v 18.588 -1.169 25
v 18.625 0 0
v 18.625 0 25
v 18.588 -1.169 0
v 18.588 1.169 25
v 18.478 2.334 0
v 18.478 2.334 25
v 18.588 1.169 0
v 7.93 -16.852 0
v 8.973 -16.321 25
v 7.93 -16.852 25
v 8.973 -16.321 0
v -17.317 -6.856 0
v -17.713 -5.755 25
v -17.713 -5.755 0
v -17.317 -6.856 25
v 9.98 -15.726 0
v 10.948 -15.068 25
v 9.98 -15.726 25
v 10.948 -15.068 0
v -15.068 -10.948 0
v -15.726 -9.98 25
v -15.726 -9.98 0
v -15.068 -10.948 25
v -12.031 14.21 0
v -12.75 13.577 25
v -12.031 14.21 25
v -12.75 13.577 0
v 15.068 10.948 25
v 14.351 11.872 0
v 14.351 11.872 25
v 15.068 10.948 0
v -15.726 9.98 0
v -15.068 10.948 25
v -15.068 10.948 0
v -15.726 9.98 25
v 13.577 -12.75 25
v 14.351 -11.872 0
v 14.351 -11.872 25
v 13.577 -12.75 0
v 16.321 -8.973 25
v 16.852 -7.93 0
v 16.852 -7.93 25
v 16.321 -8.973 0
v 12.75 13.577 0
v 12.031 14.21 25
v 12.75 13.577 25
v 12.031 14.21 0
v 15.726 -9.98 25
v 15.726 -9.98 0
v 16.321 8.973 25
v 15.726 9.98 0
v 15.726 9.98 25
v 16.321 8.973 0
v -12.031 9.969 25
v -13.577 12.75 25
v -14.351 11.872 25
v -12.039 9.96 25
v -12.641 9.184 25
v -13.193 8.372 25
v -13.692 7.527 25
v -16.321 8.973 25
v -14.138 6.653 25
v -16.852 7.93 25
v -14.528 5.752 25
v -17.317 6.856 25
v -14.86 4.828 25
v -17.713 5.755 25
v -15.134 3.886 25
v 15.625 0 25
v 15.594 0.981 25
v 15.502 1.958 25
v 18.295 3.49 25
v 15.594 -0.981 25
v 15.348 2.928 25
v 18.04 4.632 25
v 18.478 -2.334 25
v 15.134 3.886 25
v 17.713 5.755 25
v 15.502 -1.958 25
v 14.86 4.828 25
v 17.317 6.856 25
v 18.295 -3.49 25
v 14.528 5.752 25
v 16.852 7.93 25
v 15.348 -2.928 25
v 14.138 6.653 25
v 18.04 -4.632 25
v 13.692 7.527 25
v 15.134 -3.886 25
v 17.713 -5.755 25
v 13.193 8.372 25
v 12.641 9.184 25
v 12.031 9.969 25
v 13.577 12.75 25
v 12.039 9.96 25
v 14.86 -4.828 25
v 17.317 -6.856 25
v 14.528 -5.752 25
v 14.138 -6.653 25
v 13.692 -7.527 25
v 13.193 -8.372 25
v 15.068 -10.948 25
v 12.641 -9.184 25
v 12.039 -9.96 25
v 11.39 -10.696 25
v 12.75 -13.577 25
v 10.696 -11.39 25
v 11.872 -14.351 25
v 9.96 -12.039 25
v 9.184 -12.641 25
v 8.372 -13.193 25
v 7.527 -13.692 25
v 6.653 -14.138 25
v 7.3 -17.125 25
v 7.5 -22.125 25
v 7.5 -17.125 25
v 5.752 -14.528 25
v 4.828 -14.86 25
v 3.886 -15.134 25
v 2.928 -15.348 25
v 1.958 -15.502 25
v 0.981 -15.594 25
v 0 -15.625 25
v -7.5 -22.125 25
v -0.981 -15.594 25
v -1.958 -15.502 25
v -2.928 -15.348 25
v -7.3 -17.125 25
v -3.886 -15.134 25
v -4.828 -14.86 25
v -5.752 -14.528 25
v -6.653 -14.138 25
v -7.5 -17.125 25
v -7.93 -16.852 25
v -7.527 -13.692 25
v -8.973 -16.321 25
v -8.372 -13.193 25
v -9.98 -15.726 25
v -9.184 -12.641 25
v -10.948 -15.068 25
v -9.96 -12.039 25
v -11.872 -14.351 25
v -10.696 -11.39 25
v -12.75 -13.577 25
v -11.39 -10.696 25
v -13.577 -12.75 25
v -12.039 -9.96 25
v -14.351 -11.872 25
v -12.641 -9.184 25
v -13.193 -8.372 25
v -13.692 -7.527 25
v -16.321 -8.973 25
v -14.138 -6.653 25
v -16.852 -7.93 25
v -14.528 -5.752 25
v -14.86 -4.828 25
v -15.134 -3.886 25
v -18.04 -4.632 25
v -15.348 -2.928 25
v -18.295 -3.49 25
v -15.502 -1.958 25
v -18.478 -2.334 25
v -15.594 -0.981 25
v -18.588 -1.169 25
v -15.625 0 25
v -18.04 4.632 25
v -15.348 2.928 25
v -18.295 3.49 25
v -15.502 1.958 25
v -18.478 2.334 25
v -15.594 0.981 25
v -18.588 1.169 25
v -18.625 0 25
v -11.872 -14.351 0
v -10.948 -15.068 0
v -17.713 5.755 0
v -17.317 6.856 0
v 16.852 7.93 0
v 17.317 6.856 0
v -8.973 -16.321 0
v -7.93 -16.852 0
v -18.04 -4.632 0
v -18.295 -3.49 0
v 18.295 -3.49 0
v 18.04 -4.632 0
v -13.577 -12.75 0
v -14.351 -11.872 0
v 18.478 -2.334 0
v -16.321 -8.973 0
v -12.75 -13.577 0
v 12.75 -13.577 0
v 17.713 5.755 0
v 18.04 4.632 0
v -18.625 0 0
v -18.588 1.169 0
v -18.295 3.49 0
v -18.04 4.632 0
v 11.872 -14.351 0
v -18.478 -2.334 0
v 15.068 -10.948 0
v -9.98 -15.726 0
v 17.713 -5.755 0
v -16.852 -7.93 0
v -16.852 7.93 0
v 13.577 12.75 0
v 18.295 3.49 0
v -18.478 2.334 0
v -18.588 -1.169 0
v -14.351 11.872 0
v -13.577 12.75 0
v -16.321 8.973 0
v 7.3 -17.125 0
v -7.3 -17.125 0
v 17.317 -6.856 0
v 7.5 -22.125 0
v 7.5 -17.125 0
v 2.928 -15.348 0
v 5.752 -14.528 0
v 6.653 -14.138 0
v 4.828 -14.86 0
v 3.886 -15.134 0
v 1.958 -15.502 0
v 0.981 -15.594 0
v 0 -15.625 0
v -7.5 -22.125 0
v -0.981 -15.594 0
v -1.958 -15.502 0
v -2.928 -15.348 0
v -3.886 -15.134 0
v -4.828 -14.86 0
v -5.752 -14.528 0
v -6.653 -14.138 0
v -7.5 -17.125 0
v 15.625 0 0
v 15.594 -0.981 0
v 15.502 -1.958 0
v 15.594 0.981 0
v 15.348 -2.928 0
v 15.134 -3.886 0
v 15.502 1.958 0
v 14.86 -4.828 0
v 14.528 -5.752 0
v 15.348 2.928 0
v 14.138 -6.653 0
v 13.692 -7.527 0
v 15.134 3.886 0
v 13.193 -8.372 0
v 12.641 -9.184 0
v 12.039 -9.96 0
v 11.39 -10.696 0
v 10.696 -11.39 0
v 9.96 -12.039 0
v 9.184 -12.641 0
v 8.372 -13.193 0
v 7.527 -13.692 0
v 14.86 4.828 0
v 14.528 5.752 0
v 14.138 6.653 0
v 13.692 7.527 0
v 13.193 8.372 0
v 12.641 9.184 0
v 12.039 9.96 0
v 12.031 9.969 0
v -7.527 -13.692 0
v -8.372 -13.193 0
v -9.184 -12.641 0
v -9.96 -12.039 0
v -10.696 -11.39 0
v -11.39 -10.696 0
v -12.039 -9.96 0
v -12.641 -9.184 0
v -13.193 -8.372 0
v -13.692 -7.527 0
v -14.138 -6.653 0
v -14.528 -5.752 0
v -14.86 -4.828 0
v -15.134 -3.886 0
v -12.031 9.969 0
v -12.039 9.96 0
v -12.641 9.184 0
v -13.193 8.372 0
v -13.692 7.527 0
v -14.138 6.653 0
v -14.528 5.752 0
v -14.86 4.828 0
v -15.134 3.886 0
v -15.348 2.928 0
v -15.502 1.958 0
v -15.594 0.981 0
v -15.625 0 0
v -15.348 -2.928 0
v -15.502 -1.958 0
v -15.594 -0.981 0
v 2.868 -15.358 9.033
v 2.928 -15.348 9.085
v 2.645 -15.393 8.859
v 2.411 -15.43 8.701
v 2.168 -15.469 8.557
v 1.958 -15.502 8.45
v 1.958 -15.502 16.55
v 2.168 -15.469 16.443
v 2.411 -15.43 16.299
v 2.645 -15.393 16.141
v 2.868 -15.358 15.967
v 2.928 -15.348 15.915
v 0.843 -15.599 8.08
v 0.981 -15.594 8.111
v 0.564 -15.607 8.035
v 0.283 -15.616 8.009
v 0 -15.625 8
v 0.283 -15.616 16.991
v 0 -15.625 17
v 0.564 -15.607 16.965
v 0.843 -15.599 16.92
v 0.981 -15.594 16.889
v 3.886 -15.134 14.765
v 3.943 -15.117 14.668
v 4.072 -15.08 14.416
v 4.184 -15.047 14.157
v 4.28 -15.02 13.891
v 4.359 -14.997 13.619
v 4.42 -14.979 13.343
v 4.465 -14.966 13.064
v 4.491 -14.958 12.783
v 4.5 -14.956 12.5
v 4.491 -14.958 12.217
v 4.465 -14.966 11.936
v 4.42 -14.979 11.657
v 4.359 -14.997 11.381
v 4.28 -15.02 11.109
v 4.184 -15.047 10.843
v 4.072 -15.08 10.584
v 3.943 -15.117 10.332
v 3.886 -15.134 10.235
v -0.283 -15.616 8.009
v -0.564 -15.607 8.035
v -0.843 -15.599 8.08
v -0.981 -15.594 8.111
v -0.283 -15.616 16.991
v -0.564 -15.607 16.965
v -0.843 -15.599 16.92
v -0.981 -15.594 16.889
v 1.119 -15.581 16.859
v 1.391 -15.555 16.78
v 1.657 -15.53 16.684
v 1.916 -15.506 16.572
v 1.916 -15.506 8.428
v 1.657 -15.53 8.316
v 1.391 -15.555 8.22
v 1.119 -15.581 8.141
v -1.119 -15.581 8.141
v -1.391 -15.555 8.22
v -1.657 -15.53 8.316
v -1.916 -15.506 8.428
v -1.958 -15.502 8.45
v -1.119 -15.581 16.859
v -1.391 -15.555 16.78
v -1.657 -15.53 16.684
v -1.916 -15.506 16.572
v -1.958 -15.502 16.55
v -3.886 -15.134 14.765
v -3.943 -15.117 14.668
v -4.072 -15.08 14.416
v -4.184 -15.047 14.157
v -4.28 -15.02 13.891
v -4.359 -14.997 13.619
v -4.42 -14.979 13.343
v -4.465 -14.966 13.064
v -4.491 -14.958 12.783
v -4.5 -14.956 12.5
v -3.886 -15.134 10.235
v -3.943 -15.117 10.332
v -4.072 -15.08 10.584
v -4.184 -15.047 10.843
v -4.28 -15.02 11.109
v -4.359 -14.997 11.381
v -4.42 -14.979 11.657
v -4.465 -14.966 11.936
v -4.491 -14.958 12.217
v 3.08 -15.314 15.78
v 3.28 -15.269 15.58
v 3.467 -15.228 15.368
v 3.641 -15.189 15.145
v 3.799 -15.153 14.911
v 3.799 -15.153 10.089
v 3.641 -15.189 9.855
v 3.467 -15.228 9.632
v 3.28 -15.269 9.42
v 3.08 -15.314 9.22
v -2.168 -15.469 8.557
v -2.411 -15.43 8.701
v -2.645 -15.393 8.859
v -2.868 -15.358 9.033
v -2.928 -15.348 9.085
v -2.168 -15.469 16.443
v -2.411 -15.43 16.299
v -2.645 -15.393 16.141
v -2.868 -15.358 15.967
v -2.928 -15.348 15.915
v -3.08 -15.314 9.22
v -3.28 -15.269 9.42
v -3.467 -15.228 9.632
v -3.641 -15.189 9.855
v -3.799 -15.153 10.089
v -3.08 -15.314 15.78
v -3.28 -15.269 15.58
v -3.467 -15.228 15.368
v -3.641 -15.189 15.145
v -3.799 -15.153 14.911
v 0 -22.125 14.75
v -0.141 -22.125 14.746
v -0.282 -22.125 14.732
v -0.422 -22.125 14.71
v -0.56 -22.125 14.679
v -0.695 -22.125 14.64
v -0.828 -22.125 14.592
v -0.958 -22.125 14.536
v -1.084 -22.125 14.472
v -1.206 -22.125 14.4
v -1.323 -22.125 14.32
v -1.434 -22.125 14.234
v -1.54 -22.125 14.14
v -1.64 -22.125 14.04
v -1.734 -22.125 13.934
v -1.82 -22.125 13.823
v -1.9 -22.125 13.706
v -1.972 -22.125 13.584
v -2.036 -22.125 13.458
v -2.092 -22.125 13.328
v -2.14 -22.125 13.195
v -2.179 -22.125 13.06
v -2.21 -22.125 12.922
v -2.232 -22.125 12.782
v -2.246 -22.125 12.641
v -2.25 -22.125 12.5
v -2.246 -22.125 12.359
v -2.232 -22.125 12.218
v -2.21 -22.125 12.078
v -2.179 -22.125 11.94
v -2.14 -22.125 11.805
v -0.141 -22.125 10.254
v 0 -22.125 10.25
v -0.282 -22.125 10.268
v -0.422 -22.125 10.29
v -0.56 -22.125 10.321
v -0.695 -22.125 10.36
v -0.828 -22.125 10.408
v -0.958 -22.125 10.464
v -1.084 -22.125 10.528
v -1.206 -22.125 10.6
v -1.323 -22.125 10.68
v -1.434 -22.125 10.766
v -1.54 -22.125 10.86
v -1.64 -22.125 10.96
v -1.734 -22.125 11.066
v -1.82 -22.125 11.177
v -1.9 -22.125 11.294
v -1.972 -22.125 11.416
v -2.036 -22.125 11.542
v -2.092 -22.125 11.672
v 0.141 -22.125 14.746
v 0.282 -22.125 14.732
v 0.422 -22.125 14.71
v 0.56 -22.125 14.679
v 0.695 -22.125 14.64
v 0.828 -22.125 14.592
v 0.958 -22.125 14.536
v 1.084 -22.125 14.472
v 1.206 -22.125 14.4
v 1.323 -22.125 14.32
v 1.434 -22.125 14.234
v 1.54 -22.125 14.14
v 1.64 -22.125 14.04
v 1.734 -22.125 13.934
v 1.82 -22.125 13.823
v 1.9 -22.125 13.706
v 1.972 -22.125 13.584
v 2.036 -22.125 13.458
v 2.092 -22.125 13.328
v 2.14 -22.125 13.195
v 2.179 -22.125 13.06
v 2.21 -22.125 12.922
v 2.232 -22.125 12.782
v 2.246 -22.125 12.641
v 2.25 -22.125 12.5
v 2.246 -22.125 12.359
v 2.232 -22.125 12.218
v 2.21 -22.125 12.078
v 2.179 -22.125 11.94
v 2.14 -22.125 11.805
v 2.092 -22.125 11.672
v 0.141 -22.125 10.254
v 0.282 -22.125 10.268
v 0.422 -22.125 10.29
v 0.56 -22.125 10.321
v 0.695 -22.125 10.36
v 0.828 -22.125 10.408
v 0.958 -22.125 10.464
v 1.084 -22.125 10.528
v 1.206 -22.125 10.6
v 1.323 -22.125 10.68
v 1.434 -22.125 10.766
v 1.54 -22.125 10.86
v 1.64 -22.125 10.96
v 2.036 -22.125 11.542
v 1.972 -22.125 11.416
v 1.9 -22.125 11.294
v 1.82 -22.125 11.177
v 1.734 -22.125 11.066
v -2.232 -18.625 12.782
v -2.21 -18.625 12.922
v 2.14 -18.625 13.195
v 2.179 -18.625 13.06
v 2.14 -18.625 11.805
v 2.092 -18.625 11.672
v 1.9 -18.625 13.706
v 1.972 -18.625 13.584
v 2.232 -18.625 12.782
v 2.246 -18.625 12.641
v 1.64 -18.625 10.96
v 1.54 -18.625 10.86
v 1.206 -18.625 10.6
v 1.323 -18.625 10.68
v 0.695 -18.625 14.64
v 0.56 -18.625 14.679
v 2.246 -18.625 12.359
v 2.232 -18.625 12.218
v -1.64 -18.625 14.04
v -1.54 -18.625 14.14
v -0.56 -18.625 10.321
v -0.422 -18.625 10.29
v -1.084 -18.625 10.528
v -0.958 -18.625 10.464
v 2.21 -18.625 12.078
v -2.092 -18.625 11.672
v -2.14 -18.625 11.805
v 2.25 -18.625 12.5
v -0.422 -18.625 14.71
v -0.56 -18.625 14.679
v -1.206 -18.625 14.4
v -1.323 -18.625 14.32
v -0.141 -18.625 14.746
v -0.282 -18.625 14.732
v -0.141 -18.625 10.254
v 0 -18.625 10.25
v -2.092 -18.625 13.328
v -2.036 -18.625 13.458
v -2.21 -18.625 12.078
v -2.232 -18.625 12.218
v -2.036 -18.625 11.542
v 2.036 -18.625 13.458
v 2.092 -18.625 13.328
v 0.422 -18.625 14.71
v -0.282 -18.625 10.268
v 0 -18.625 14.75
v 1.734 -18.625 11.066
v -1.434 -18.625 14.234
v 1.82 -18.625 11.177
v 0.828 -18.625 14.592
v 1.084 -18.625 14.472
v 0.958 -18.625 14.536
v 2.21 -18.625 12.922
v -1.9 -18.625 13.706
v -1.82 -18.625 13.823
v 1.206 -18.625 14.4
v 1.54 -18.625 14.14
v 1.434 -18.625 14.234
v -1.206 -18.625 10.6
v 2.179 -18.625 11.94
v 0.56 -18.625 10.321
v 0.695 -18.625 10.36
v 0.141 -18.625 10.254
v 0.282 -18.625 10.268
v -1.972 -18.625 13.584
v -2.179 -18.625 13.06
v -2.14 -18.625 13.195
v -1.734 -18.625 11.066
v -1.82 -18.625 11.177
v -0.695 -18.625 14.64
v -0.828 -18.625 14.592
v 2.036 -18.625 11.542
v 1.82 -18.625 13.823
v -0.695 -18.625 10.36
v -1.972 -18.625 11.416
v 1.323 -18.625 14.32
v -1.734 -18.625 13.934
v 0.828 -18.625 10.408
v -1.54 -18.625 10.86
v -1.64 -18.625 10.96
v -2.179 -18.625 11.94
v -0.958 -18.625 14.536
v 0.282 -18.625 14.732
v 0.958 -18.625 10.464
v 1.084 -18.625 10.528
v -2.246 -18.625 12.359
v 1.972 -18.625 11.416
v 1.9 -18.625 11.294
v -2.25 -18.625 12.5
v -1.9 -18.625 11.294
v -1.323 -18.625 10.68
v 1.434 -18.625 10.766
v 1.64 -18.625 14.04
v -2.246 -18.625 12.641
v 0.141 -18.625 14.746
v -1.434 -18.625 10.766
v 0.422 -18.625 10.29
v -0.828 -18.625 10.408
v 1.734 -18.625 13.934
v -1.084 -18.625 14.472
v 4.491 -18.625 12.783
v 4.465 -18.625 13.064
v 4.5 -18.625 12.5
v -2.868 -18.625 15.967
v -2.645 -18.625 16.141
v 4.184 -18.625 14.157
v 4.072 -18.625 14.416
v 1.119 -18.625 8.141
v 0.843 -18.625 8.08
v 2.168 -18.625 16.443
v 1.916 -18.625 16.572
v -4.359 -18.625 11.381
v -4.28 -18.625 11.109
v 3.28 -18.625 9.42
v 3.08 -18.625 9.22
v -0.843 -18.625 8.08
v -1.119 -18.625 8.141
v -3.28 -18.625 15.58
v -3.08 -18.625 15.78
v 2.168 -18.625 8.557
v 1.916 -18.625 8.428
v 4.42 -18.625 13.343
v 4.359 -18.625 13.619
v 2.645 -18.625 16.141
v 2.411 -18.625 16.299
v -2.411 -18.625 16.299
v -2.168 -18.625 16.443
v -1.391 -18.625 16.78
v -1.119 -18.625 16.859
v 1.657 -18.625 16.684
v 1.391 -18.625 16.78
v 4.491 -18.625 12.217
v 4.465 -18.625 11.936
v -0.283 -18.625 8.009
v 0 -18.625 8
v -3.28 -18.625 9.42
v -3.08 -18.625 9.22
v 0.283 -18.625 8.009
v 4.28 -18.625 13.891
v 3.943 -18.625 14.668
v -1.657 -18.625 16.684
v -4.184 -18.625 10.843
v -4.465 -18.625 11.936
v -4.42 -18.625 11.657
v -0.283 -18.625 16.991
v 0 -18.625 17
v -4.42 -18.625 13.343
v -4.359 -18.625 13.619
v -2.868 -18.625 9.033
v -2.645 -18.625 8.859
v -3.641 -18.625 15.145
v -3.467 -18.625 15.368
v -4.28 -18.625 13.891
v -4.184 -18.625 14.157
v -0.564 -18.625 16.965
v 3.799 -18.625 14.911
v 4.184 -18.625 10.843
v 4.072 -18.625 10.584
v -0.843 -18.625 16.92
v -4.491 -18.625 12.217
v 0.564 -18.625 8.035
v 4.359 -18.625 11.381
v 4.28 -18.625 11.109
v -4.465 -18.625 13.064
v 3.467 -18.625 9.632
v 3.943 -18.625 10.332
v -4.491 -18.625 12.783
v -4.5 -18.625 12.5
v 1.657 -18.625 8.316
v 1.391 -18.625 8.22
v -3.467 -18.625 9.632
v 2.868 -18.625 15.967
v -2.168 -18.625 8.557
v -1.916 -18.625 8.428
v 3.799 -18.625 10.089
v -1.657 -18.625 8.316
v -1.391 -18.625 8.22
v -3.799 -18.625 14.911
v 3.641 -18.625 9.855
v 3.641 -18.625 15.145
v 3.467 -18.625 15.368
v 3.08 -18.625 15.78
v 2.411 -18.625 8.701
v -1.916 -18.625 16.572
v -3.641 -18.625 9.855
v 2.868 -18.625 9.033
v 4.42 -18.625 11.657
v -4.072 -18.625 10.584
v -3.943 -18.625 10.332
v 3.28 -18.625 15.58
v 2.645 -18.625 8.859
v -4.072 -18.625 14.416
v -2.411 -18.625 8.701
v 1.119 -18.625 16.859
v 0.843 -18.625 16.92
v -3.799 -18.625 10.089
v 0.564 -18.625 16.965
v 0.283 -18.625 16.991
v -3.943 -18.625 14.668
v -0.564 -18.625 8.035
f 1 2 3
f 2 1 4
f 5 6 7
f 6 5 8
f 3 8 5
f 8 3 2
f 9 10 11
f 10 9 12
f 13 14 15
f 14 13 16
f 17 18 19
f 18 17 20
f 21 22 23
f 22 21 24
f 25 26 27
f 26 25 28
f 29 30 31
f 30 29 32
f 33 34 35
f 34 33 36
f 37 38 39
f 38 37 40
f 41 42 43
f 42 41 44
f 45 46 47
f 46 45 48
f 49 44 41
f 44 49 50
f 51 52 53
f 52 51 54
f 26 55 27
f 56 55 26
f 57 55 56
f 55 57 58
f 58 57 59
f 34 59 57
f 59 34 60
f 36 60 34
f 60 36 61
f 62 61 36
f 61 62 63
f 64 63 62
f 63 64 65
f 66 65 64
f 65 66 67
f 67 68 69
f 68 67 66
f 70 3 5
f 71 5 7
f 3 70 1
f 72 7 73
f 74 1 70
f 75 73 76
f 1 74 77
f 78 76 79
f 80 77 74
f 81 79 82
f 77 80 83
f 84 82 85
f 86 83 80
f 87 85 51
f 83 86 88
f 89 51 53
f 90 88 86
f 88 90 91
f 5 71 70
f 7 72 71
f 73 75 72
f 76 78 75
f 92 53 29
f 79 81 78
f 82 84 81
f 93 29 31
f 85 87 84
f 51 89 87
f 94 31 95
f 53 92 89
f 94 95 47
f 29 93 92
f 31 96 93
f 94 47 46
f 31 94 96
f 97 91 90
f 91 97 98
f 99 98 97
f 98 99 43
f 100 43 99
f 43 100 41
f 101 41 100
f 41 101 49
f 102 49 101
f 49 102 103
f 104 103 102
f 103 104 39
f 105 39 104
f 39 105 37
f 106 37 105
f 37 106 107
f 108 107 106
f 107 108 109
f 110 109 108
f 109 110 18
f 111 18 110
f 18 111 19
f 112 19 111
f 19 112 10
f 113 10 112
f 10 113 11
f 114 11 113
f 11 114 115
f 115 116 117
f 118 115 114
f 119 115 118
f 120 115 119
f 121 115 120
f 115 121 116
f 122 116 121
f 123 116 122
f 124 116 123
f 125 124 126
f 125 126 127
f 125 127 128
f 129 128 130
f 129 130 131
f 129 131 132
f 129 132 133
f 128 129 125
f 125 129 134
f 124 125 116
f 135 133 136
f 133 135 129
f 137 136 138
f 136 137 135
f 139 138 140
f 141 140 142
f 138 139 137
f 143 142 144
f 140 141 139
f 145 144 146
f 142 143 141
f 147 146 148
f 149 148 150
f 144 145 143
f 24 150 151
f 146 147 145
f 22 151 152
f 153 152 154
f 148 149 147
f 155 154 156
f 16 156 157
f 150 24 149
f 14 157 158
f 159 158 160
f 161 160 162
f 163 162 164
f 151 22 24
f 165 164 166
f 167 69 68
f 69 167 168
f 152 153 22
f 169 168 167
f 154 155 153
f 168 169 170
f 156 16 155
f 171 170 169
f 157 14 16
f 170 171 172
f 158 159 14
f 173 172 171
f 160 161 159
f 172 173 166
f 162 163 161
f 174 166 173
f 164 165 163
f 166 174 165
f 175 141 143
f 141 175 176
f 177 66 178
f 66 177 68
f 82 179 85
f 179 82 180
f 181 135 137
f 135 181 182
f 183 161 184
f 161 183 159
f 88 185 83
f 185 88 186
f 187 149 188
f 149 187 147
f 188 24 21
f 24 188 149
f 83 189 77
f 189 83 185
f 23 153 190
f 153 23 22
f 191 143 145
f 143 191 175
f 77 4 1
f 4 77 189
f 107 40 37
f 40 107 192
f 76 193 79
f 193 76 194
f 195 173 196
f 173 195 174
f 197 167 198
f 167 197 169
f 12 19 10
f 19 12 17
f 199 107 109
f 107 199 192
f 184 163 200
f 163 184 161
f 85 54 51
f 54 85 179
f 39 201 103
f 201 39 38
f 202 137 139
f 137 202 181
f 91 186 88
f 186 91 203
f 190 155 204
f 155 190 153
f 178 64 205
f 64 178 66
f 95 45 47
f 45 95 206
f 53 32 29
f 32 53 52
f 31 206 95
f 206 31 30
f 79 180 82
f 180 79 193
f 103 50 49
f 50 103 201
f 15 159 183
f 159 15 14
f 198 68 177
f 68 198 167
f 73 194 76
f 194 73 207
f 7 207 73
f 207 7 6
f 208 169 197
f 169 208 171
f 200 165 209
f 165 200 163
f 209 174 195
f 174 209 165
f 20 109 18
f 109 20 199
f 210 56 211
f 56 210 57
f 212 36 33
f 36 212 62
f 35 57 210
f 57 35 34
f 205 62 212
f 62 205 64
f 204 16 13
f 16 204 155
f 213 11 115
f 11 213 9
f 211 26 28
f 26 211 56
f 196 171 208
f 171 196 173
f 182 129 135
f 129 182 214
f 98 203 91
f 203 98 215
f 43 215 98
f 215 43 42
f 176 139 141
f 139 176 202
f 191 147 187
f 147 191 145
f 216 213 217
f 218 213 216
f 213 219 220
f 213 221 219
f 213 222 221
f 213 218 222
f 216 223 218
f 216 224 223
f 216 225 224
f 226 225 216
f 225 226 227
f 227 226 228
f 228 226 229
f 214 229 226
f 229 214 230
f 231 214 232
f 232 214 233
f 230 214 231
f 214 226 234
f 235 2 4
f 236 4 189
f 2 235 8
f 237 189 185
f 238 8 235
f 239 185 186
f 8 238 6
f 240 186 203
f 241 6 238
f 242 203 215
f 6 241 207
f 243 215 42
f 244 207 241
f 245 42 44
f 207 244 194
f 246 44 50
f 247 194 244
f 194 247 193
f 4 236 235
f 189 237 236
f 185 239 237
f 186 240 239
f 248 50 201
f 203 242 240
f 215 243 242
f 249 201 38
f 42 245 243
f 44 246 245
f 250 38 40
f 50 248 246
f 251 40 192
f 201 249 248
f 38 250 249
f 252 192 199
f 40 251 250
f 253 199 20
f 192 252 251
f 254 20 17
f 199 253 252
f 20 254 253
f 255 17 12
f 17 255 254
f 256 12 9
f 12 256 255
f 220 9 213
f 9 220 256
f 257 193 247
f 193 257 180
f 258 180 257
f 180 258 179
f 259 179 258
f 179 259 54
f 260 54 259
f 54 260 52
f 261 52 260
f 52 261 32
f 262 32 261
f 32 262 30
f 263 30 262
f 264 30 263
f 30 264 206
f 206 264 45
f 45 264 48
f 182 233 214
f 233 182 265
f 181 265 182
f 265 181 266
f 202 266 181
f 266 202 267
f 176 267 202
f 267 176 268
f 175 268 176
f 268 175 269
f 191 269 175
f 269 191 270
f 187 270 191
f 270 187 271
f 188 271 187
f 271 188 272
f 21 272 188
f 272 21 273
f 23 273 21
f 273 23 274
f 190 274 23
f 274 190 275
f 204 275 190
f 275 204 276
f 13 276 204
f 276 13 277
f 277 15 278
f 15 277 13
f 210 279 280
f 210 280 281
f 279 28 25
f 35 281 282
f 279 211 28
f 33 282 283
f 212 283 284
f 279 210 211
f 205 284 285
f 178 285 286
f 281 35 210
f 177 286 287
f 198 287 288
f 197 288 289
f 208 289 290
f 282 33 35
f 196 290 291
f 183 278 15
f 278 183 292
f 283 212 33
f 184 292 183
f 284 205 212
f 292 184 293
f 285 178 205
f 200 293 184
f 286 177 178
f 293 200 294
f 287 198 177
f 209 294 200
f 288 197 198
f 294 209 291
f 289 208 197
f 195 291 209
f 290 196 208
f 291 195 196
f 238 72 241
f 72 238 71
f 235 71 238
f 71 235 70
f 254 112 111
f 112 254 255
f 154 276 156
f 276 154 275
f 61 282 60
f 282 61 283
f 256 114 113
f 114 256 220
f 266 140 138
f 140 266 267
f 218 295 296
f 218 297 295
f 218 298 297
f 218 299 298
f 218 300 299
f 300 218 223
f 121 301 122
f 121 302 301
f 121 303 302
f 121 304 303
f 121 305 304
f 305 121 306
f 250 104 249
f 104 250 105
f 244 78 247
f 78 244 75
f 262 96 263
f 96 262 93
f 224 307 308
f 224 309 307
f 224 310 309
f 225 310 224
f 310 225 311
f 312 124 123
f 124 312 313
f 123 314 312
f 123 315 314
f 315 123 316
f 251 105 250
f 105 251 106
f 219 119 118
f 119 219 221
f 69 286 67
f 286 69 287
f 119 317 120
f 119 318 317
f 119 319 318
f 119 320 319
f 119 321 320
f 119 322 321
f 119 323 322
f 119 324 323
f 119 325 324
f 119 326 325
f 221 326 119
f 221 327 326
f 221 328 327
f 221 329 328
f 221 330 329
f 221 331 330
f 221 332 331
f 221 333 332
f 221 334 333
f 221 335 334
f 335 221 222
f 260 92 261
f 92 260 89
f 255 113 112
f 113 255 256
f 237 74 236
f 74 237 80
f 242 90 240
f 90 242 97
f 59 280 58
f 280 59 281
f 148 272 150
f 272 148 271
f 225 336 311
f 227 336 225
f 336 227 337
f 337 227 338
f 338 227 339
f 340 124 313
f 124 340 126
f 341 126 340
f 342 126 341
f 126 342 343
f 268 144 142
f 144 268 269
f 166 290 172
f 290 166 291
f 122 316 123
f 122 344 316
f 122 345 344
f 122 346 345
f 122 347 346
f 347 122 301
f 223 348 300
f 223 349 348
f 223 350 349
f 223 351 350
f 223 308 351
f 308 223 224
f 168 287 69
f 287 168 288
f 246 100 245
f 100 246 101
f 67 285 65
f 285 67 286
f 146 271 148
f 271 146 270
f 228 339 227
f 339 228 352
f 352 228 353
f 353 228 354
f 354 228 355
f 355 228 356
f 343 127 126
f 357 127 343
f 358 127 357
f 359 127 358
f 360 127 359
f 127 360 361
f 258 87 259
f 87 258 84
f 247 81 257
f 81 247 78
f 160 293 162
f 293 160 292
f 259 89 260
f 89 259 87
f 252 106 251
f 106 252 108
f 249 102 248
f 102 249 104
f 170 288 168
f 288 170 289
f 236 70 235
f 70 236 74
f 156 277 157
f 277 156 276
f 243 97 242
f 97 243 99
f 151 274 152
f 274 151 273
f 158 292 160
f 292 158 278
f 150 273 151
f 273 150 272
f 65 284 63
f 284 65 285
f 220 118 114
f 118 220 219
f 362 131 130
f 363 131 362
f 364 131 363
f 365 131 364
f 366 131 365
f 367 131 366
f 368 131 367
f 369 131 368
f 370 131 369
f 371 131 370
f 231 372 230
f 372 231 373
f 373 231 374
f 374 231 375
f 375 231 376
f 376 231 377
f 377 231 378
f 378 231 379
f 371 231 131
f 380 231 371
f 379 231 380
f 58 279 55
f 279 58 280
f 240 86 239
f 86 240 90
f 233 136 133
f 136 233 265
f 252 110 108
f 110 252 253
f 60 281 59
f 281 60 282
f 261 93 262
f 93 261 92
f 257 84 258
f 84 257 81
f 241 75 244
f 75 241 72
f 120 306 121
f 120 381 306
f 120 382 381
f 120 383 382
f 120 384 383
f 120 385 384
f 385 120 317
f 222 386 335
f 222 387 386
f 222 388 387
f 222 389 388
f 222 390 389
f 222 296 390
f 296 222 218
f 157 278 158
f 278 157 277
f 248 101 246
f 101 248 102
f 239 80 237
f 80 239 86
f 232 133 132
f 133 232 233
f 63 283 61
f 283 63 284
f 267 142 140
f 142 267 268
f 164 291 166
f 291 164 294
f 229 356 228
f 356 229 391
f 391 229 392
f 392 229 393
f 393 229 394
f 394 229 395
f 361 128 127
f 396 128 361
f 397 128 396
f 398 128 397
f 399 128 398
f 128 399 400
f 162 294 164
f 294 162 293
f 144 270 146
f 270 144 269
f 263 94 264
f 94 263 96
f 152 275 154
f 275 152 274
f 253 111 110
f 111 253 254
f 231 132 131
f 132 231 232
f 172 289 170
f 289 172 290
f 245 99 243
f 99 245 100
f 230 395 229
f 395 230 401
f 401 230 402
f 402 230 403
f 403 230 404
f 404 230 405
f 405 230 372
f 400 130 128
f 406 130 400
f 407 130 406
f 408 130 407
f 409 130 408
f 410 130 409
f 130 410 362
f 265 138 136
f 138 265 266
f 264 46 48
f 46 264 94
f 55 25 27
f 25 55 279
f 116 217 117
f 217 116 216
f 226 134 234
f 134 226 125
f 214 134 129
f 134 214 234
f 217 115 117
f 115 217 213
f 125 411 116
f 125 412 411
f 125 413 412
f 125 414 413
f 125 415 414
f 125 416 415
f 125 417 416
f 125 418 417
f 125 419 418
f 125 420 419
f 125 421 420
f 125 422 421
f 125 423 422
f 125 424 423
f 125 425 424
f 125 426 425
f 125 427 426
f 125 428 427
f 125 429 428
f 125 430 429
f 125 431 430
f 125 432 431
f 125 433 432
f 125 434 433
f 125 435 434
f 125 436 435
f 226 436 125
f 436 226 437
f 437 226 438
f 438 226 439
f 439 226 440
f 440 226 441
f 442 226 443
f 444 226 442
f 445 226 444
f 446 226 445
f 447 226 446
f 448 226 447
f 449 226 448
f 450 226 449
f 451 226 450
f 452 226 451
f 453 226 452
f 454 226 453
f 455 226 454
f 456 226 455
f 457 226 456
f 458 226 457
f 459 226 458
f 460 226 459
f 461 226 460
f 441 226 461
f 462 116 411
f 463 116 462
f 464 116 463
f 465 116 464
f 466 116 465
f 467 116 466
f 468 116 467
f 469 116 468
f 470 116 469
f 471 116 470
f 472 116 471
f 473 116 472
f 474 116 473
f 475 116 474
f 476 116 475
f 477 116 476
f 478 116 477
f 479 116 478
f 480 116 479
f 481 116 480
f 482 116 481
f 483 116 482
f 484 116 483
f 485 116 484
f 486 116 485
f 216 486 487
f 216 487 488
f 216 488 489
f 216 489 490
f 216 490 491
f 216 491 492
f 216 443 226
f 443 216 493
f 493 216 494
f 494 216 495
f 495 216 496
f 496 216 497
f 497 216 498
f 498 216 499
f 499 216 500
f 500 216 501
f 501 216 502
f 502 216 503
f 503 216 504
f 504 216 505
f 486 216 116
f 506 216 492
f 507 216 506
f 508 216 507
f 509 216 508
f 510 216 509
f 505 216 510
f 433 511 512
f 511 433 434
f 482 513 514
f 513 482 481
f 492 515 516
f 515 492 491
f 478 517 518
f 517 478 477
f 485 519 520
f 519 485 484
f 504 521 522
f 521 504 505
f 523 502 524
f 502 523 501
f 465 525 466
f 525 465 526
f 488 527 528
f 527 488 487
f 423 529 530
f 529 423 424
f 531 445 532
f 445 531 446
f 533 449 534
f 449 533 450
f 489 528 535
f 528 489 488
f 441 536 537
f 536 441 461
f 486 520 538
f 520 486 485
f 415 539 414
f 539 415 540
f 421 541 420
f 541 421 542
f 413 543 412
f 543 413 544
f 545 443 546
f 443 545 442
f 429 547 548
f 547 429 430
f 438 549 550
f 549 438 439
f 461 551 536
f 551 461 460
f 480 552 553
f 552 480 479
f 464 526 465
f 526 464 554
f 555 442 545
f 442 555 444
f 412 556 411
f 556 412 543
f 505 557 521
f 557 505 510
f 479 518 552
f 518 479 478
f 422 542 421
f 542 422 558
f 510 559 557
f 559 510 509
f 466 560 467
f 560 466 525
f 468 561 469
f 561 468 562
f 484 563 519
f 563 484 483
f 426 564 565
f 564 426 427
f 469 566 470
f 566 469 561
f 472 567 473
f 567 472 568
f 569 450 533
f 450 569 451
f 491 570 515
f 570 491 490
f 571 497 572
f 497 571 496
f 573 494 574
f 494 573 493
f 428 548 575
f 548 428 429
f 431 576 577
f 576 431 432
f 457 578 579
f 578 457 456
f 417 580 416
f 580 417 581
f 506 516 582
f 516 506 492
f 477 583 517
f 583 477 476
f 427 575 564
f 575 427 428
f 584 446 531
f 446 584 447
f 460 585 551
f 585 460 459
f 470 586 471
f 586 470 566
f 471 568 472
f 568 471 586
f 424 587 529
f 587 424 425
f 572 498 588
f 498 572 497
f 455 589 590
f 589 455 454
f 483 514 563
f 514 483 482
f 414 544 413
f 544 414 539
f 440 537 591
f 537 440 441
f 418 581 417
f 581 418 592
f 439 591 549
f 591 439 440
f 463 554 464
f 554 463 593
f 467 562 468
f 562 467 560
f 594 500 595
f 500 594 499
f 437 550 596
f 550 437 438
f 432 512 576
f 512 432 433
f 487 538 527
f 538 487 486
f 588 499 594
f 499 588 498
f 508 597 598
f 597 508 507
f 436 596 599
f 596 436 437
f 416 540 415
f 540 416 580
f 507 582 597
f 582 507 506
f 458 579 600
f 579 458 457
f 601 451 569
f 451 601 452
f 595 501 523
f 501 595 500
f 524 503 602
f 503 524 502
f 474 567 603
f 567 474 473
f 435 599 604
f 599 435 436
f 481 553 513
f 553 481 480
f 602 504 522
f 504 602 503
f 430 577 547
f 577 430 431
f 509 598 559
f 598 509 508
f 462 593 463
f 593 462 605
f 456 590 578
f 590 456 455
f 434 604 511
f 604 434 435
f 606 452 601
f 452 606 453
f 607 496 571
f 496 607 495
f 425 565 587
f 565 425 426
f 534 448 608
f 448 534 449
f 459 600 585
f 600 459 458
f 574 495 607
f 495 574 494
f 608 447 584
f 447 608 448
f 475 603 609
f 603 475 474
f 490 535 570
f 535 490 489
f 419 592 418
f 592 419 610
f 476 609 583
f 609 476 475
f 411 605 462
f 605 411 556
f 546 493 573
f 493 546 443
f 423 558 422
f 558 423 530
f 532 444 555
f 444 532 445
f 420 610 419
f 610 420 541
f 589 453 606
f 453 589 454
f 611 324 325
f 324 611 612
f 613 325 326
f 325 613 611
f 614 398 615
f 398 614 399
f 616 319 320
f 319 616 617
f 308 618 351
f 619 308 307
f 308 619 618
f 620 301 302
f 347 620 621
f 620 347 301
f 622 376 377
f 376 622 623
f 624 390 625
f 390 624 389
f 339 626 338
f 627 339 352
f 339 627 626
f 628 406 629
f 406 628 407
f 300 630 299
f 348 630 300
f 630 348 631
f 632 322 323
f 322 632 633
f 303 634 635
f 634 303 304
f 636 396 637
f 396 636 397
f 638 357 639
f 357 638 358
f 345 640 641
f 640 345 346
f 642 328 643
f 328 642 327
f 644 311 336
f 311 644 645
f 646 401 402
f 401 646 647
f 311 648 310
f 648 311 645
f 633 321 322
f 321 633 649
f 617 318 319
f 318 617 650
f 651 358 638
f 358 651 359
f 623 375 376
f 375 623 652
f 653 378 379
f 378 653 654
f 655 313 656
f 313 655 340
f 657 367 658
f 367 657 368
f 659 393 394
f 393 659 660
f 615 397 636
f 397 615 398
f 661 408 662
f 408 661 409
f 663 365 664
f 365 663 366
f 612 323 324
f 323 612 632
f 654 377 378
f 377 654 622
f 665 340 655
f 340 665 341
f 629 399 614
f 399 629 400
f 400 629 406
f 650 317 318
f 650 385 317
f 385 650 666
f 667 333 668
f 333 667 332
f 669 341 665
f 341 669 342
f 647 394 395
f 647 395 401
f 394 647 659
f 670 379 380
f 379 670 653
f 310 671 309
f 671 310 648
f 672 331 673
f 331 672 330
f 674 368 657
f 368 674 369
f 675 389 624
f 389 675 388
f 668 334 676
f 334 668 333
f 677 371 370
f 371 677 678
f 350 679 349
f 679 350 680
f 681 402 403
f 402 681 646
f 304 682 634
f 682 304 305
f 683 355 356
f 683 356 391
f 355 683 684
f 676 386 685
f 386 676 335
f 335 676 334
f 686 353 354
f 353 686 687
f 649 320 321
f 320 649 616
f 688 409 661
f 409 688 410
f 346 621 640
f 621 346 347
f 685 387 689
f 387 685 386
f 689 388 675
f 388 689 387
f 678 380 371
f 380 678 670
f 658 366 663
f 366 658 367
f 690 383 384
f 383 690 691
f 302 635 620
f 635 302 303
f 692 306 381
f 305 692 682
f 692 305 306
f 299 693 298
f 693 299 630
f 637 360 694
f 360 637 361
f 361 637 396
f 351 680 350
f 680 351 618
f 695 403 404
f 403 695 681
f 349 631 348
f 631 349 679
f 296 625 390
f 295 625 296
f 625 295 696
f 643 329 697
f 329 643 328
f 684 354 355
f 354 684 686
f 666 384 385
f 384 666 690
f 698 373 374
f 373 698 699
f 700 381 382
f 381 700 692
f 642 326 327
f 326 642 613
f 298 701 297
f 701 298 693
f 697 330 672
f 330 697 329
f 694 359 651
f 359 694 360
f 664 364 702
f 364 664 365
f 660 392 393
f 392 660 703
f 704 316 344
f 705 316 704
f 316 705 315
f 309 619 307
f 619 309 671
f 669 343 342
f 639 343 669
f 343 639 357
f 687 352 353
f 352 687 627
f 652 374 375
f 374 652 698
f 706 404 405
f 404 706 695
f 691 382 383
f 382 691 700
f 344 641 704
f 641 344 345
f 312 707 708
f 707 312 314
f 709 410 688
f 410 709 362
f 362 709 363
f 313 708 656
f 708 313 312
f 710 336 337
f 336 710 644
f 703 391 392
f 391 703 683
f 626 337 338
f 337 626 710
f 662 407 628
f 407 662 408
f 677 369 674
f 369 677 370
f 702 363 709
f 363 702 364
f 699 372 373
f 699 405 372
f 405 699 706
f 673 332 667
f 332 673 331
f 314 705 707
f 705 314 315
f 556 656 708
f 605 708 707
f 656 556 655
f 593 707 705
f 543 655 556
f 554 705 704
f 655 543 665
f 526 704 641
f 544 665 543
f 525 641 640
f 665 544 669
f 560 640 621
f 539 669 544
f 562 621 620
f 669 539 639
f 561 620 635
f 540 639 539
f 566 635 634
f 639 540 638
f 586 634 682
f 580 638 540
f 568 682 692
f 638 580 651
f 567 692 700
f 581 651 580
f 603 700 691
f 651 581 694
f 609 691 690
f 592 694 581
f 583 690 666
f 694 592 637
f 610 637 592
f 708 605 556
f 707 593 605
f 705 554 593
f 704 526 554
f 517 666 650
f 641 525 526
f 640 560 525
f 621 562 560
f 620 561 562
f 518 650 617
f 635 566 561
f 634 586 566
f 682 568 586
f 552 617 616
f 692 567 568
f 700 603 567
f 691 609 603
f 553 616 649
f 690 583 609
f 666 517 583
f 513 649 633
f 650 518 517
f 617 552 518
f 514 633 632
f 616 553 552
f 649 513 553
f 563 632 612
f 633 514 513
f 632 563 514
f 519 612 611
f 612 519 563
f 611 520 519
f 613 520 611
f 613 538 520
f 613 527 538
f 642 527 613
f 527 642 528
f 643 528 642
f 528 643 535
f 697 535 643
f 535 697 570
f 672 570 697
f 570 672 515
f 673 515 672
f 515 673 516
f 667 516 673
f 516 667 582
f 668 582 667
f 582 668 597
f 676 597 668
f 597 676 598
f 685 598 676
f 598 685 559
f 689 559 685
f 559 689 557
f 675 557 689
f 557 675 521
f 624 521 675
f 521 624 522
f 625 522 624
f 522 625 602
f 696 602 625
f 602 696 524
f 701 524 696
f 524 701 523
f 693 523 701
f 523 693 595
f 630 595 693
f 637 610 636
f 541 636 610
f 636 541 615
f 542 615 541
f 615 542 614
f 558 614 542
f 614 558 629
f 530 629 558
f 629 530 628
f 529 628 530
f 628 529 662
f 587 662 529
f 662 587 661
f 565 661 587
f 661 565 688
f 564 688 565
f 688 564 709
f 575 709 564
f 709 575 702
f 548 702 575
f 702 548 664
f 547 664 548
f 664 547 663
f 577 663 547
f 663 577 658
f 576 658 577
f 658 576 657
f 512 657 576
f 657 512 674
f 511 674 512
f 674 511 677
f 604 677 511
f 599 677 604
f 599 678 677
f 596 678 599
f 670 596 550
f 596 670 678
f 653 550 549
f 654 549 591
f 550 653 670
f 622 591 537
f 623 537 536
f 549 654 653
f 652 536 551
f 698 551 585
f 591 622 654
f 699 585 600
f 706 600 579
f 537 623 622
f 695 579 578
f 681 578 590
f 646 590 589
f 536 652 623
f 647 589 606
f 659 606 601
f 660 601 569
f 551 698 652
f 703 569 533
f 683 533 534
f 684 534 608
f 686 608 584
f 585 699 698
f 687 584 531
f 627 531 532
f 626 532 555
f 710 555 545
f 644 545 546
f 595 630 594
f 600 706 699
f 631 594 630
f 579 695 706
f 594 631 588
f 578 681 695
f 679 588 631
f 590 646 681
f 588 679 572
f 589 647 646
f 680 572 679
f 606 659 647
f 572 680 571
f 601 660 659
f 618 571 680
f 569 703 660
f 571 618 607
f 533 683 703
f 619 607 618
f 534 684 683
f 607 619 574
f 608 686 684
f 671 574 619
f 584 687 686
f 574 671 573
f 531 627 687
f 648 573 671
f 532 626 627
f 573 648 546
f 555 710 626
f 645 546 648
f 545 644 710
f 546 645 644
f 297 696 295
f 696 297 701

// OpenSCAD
//Clamp for the mount for WLANThermo Nano, Mini, MiniV2
//Fully configurable
//(c)Armin Thinnes, Juni 2018
//Find more about the fine BBQ-thermometre at https://www.wlanthermo/de and visit the forum: https://forum.wlanthermo.de




innendurchmesser=31.25; //inner diametre, 31.25 for Napoleon handle, 25 for Weber kettle-leg
wandstaerke=3; //wallthickness
breite=25; //clamp-width
oeffnung=0.77; // percentage of diameter for the opening
flanschbreite=15; //width of flansch
flanschhoehe=5; //thickness of flansch, make sure it is > wandstaerke/2

aussendurchmesser=2*wandstaerke+innendurchmesser;
$fn=100;

module ring() {
difference(){
    cylinder (d=aussendurchmesser,h=breite);
    cylinder (d=innendurchmesser,h=breite);
    translate ([-oeffnung*innendurchmesser/2,0,0]) cube([oeffnung*innendurchmesser,aussendurchmesser,breite]);
}
}
module ring_plus(){
    ring();
    translate([-flanschbreite/2,-(innendurchmesser/2+flanschhoehe+wandstaerke/2),0]) cube([flanschbreite,flanschhoehe,breite]);
};
difference(){
    ring_plus();
    translate ([0,0,breite/2]) rotate([90,0,0]) cylinder(d=4.5, h=innendurchmesser/2+wandstaerke+flanschhoehe);
    translate ([0,0,breite/2]) rotate([90,0,0]) cylinder(d=9, h=innendurchmesser/2 + wandstaerke);
};
